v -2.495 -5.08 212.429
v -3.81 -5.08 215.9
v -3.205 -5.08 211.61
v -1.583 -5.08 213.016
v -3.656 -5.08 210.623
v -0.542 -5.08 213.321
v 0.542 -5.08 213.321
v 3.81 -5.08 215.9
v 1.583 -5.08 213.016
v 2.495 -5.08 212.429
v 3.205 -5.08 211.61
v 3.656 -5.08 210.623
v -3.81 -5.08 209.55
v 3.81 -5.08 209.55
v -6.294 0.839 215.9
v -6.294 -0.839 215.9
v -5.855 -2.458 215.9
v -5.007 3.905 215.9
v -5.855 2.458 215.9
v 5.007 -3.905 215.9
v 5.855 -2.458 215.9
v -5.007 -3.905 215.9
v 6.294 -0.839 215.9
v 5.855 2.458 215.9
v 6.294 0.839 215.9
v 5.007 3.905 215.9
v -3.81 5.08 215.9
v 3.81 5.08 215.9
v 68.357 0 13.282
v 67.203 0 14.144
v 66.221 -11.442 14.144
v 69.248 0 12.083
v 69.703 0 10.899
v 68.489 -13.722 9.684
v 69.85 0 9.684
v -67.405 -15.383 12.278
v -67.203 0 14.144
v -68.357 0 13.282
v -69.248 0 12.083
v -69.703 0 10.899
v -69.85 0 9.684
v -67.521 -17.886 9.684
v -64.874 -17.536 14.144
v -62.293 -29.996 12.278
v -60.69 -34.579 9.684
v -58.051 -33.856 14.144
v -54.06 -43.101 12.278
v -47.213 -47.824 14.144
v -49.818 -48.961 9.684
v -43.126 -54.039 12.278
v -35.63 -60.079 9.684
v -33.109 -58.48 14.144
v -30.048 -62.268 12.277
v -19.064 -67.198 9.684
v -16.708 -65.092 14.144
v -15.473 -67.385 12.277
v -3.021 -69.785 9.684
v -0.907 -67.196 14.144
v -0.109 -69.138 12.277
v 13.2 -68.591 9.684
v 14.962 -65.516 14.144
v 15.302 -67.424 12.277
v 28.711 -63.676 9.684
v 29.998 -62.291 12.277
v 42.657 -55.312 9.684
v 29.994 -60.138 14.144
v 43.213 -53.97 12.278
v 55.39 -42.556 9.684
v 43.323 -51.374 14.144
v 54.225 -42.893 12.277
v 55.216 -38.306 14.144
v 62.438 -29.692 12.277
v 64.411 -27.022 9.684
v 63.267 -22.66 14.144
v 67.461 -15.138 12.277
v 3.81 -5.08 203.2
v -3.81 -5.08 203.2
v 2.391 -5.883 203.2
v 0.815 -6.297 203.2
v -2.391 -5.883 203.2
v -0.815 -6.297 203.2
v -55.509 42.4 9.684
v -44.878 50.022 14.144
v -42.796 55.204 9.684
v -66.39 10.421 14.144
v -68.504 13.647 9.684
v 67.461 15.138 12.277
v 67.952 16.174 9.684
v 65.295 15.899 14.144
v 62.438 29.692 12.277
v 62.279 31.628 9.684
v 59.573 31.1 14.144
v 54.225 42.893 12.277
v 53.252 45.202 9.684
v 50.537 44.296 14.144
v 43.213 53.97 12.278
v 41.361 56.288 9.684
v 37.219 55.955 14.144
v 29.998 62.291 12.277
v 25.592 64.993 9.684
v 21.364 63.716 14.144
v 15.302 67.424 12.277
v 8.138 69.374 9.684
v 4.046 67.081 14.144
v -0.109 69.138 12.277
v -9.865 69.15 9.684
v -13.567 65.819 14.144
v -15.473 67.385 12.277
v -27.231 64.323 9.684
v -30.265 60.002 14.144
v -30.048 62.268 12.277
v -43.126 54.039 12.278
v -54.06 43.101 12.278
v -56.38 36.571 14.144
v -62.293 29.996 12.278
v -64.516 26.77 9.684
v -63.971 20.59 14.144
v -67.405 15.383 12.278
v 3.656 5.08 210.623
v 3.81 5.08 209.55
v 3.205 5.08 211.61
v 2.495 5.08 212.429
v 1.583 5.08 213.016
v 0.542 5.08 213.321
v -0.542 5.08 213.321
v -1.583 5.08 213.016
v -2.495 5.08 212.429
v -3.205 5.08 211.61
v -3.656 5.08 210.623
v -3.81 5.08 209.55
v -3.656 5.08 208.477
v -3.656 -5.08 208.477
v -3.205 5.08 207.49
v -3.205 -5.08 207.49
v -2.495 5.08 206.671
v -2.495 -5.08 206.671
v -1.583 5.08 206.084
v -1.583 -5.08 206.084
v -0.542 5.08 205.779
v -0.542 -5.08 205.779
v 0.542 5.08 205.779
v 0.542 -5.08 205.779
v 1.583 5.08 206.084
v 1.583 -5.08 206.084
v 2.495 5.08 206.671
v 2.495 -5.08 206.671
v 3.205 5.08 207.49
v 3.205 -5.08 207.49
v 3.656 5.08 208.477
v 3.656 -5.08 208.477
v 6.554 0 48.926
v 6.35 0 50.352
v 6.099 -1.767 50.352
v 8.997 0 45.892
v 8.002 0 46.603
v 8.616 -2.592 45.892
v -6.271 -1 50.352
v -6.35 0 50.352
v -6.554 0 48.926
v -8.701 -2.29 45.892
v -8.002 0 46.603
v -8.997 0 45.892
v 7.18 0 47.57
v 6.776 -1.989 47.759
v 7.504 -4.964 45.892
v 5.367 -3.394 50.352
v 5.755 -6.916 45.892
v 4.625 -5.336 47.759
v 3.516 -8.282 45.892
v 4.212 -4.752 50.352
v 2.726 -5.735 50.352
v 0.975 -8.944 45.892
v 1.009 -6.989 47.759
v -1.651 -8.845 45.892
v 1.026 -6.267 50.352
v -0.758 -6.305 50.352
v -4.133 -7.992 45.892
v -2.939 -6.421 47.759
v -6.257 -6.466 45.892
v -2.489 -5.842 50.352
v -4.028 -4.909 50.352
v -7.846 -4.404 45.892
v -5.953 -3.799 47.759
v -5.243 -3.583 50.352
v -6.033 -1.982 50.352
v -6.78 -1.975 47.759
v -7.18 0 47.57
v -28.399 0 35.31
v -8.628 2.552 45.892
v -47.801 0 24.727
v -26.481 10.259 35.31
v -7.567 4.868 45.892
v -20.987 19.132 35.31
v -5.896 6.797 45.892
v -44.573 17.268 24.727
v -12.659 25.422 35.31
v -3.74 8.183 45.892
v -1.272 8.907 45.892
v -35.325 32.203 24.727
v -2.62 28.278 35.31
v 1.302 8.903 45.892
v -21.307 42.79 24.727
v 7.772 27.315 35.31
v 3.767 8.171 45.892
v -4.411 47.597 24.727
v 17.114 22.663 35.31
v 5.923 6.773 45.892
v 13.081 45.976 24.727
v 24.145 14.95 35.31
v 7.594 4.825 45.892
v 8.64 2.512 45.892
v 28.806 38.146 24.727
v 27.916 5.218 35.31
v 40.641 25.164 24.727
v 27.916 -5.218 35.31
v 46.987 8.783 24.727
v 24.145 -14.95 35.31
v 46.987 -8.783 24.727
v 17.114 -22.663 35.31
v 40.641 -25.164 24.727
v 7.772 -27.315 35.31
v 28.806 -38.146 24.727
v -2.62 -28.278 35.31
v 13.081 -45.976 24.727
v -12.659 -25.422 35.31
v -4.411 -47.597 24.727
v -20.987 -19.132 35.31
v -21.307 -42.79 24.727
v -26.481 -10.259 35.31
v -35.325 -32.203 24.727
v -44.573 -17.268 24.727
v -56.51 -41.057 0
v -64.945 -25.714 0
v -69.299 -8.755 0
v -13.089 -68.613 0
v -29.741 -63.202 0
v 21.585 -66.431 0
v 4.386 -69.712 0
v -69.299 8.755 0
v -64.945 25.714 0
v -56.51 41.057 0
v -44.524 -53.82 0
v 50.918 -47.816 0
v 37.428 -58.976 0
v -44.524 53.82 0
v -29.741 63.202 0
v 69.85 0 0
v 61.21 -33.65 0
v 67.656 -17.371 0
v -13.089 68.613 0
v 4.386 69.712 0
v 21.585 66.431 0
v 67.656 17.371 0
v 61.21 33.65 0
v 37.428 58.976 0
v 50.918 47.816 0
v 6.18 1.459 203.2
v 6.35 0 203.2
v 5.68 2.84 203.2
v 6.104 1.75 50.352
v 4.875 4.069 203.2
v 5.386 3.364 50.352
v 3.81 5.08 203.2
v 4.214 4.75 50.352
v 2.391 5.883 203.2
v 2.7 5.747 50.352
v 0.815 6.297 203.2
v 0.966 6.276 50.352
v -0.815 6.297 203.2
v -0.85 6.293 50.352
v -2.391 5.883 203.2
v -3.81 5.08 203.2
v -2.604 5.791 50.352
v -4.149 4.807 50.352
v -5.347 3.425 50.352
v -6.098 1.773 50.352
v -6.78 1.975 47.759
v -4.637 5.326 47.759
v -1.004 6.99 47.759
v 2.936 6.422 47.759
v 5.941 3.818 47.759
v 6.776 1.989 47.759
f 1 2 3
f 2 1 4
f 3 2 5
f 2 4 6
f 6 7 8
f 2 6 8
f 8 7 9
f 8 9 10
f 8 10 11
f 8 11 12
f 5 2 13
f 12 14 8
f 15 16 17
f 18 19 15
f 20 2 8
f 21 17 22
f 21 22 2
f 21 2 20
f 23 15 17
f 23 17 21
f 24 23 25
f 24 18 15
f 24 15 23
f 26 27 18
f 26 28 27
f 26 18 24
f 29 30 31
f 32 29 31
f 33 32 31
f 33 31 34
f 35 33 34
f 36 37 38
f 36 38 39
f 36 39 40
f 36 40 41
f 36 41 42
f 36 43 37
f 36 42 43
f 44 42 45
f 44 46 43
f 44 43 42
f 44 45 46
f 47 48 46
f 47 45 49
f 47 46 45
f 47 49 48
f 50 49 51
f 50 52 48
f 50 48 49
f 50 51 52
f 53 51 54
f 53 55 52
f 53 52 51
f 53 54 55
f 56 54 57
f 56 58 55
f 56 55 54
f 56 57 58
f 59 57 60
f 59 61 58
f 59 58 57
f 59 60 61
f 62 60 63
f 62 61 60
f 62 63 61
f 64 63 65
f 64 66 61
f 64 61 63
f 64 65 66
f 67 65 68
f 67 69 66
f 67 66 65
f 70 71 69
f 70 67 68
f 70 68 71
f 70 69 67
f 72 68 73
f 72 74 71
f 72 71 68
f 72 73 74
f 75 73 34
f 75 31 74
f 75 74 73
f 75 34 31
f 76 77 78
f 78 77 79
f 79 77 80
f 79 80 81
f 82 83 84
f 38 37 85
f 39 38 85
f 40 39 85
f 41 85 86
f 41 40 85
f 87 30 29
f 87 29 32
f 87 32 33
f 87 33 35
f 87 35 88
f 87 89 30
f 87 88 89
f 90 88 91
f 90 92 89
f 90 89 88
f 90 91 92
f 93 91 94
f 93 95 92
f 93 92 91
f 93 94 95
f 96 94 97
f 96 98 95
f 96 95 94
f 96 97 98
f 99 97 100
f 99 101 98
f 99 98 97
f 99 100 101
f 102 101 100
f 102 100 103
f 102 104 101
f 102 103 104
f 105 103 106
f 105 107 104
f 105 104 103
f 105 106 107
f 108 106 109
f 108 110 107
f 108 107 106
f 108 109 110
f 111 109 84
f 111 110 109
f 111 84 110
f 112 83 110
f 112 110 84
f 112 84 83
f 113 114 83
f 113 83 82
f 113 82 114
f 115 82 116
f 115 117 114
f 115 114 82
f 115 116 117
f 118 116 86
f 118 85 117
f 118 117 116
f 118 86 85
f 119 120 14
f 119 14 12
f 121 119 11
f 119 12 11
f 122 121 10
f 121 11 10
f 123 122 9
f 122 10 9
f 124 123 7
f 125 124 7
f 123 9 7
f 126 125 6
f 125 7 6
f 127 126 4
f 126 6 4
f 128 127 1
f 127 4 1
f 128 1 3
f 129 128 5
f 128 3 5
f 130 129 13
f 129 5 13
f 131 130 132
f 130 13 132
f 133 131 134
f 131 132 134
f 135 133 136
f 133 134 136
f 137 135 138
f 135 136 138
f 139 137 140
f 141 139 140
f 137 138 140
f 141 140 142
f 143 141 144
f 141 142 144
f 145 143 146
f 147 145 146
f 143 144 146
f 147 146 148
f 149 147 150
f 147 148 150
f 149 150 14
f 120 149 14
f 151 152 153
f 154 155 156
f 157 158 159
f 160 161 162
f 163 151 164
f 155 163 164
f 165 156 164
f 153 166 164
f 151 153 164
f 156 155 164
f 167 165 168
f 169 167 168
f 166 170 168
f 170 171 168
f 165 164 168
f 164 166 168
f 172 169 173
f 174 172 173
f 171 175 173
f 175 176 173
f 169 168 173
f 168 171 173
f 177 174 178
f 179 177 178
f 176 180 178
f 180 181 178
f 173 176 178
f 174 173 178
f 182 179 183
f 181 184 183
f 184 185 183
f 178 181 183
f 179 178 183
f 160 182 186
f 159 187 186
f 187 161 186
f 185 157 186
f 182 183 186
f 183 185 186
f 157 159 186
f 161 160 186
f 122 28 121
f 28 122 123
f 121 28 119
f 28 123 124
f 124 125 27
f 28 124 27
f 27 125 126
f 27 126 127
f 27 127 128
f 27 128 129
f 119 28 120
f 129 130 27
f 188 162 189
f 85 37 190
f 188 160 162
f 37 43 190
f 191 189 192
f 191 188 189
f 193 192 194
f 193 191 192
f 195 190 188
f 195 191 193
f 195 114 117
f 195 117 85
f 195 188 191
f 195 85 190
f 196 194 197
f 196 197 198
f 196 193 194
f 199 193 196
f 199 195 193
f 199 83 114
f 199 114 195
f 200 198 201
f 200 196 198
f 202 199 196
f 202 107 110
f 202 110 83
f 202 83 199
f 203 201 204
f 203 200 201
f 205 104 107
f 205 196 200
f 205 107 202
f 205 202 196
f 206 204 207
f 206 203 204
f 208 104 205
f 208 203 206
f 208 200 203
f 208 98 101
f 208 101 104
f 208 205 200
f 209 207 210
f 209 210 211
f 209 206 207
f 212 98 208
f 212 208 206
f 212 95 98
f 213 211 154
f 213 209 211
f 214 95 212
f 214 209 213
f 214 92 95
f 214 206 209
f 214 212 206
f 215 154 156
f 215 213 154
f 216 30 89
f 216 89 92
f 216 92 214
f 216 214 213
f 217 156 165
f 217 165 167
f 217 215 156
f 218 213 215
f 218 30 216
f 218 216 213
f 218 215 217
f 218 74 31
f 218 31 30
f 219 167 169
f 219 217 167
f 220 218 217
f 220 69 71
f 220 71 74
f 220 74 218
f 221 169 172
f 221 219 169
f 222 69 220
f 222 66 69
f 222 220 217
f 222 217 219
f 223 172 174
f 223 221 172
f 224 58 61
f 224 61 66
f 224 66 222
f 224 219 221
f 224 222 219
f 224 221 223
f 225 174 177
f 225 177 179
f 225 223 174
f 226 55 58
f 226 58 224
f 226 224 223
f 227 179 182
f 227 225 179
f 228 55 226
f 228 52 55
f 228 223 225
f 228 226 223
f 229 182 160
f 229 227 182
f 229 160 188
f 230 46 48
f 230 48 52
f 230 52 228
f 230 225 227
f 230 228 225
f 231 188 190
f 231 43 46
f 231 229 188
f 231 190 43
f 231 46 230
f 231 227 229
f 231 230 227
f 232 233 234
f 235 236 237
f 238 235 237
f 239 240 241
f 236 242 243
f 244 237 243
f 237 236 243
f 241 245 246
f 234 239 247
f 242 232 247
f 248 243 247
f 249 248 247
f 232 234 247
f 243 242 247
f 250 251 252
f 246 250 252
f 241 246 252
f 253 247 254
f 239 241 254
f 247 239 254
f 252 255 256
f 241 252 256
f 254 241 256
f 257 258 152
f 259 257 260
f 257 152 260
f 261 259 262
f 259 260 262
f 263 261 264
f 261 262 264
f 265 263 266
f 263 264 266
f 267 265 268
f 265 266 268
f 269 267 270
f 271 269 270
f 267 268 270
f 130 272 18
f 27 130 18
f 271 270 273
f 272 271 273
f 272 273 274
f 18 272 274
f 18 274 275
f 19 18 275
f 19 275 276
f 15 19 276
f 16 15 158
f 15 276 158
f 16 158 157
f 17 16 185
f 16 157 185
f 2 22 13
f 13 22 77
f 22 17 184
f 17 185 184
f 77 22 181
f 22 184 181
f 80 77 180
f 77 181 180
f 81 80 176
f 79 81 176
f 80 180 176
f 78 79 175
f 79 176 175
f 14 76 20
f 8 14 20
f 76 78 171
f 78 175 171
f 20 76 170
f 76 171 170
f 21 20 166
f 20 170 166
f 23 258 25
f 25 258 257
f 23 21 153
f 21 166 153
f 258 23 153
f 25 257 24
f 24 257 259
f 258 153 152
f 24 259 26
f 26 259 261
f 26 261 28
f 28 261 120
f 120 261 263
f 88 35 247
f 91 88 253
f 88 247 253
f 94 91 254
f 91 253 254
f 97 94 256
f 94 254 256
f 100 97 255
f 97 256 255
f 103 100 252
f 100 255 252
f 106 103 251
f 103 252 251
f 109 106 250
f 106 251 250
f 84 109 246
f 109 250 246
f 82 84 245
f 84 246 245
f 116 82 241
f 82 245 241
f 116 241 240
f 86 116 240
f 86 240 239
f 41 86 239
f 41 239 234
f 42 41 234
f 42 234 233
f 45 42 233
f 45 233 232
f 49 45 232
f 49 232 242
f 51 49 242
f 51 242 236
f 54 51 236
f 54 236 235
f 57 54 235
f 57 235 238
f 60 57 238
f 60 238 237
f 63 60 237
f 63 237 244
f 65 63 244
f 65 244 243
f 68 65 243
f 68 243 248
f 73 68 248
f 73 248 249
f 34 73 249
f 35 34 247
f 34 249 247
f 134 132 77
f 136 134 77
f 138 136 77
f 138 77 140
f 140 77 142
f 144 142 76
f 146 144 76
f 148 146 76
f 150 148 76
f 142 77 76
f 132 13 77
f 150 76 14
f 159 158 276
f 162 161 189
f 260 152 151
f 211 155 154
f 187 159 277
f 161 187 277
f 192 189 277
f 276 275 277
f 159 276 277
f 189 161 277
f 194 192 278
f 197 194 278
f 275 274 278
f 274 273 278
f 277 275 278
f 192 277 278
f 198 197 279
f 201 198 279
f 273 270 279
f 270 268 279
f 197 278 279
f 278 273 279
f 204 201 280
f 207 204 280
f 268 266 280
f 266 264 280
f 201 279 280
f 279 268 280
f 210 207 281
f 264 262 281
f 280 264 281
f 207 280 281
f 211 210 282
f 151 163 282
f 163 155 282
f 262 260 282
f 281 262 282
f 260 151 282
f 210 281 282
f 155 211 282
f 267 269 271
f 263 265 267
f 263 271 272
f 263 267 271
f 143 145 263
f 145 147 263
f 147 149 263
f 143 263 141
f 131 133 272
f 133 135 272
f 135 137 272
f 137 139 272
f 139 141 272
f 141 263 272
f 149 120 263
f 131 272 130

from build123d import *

# Parameters (mm, degrees)
F0_R      = 69.85
F1_DEPTH  = 12.7
F4_R      = 5.08
F5_R      = 6.35
F6_DEPTH  = 203.2
F8_DEPTH  = 12.7
F9_R      = 3.81
F10_DEPTH = 12.7
F11_R     = 5.08


with BuildPart() as f1:
    # F0 (on Top) → F1 (new body)
    with BuildSketch(Plane.XY):
        Circle(F0_R)
    extrude(amount=F1_DEPTH)

    # F2 (on Front) → F3 (revolve)
    with BuildSketch(Plane.XZ):
        Polygon((0, 50.8), (-69.85, 12.7), (0, 12.7), align=None)
    revolve(axis=Axis((0, 0, 31.75), (0, 0, -1)))

    # F4
    f4_edges = [f1.edges().sort_by_distance(p)[0] for p in [
        (0, -69.85, 12.7),
        (0, 69.85, 12.7),
    ]]
    fillet(f4_edges, radius=F4_R)

    # F5 (on Top) → F6 (join)
    with BuildSketch(Plane.XY):
        Circle(F5_R)
    extrude(amount=F6_DEPTH)

    # F7 (on face) → F8 (join)
    with BuildSketch(Plane.XY.offset(203.2)):
        with BuildLine():
            ThreePointArc((-3.81, 5.08), (-6.35, 0), (-3.81, -5.08))
            Line((-3.81, -5.08), (3.81, -5.08))
            ThreePointArc((3.81, -5.08), (6.35, 0), (3.81, 5.08))
            Line((3.81, 5.08), (-3.81, 5.08))
        make_face()
    extrude(amount=F8_DEPTH)

    # F9 (on face) → F10 (cut, symmetric)
    with BuildSketch(Plane.XZ.offset(5.08)):
        with Locations((0, 209.55)):
            Circle(F9_R)
    extrude(amount=F10_DEPTH, both=True, mode=Mode.SUBTRACT)

    # F11
    f11_edges = [f1.edges().sort_by_distance(p)[0] for p in [
        (0, -6.35, 47.336364),
        (0, 6.35, 47.336364),
        (-36.776284, 0, 30.740209),
        (3.3e-05, 67.202608, 14.144033),
        (3.3e-05, -67.202608, 14.144033),
    ]]
    fillet(f11_edges, radius=F11_R)


solid = f1.part
